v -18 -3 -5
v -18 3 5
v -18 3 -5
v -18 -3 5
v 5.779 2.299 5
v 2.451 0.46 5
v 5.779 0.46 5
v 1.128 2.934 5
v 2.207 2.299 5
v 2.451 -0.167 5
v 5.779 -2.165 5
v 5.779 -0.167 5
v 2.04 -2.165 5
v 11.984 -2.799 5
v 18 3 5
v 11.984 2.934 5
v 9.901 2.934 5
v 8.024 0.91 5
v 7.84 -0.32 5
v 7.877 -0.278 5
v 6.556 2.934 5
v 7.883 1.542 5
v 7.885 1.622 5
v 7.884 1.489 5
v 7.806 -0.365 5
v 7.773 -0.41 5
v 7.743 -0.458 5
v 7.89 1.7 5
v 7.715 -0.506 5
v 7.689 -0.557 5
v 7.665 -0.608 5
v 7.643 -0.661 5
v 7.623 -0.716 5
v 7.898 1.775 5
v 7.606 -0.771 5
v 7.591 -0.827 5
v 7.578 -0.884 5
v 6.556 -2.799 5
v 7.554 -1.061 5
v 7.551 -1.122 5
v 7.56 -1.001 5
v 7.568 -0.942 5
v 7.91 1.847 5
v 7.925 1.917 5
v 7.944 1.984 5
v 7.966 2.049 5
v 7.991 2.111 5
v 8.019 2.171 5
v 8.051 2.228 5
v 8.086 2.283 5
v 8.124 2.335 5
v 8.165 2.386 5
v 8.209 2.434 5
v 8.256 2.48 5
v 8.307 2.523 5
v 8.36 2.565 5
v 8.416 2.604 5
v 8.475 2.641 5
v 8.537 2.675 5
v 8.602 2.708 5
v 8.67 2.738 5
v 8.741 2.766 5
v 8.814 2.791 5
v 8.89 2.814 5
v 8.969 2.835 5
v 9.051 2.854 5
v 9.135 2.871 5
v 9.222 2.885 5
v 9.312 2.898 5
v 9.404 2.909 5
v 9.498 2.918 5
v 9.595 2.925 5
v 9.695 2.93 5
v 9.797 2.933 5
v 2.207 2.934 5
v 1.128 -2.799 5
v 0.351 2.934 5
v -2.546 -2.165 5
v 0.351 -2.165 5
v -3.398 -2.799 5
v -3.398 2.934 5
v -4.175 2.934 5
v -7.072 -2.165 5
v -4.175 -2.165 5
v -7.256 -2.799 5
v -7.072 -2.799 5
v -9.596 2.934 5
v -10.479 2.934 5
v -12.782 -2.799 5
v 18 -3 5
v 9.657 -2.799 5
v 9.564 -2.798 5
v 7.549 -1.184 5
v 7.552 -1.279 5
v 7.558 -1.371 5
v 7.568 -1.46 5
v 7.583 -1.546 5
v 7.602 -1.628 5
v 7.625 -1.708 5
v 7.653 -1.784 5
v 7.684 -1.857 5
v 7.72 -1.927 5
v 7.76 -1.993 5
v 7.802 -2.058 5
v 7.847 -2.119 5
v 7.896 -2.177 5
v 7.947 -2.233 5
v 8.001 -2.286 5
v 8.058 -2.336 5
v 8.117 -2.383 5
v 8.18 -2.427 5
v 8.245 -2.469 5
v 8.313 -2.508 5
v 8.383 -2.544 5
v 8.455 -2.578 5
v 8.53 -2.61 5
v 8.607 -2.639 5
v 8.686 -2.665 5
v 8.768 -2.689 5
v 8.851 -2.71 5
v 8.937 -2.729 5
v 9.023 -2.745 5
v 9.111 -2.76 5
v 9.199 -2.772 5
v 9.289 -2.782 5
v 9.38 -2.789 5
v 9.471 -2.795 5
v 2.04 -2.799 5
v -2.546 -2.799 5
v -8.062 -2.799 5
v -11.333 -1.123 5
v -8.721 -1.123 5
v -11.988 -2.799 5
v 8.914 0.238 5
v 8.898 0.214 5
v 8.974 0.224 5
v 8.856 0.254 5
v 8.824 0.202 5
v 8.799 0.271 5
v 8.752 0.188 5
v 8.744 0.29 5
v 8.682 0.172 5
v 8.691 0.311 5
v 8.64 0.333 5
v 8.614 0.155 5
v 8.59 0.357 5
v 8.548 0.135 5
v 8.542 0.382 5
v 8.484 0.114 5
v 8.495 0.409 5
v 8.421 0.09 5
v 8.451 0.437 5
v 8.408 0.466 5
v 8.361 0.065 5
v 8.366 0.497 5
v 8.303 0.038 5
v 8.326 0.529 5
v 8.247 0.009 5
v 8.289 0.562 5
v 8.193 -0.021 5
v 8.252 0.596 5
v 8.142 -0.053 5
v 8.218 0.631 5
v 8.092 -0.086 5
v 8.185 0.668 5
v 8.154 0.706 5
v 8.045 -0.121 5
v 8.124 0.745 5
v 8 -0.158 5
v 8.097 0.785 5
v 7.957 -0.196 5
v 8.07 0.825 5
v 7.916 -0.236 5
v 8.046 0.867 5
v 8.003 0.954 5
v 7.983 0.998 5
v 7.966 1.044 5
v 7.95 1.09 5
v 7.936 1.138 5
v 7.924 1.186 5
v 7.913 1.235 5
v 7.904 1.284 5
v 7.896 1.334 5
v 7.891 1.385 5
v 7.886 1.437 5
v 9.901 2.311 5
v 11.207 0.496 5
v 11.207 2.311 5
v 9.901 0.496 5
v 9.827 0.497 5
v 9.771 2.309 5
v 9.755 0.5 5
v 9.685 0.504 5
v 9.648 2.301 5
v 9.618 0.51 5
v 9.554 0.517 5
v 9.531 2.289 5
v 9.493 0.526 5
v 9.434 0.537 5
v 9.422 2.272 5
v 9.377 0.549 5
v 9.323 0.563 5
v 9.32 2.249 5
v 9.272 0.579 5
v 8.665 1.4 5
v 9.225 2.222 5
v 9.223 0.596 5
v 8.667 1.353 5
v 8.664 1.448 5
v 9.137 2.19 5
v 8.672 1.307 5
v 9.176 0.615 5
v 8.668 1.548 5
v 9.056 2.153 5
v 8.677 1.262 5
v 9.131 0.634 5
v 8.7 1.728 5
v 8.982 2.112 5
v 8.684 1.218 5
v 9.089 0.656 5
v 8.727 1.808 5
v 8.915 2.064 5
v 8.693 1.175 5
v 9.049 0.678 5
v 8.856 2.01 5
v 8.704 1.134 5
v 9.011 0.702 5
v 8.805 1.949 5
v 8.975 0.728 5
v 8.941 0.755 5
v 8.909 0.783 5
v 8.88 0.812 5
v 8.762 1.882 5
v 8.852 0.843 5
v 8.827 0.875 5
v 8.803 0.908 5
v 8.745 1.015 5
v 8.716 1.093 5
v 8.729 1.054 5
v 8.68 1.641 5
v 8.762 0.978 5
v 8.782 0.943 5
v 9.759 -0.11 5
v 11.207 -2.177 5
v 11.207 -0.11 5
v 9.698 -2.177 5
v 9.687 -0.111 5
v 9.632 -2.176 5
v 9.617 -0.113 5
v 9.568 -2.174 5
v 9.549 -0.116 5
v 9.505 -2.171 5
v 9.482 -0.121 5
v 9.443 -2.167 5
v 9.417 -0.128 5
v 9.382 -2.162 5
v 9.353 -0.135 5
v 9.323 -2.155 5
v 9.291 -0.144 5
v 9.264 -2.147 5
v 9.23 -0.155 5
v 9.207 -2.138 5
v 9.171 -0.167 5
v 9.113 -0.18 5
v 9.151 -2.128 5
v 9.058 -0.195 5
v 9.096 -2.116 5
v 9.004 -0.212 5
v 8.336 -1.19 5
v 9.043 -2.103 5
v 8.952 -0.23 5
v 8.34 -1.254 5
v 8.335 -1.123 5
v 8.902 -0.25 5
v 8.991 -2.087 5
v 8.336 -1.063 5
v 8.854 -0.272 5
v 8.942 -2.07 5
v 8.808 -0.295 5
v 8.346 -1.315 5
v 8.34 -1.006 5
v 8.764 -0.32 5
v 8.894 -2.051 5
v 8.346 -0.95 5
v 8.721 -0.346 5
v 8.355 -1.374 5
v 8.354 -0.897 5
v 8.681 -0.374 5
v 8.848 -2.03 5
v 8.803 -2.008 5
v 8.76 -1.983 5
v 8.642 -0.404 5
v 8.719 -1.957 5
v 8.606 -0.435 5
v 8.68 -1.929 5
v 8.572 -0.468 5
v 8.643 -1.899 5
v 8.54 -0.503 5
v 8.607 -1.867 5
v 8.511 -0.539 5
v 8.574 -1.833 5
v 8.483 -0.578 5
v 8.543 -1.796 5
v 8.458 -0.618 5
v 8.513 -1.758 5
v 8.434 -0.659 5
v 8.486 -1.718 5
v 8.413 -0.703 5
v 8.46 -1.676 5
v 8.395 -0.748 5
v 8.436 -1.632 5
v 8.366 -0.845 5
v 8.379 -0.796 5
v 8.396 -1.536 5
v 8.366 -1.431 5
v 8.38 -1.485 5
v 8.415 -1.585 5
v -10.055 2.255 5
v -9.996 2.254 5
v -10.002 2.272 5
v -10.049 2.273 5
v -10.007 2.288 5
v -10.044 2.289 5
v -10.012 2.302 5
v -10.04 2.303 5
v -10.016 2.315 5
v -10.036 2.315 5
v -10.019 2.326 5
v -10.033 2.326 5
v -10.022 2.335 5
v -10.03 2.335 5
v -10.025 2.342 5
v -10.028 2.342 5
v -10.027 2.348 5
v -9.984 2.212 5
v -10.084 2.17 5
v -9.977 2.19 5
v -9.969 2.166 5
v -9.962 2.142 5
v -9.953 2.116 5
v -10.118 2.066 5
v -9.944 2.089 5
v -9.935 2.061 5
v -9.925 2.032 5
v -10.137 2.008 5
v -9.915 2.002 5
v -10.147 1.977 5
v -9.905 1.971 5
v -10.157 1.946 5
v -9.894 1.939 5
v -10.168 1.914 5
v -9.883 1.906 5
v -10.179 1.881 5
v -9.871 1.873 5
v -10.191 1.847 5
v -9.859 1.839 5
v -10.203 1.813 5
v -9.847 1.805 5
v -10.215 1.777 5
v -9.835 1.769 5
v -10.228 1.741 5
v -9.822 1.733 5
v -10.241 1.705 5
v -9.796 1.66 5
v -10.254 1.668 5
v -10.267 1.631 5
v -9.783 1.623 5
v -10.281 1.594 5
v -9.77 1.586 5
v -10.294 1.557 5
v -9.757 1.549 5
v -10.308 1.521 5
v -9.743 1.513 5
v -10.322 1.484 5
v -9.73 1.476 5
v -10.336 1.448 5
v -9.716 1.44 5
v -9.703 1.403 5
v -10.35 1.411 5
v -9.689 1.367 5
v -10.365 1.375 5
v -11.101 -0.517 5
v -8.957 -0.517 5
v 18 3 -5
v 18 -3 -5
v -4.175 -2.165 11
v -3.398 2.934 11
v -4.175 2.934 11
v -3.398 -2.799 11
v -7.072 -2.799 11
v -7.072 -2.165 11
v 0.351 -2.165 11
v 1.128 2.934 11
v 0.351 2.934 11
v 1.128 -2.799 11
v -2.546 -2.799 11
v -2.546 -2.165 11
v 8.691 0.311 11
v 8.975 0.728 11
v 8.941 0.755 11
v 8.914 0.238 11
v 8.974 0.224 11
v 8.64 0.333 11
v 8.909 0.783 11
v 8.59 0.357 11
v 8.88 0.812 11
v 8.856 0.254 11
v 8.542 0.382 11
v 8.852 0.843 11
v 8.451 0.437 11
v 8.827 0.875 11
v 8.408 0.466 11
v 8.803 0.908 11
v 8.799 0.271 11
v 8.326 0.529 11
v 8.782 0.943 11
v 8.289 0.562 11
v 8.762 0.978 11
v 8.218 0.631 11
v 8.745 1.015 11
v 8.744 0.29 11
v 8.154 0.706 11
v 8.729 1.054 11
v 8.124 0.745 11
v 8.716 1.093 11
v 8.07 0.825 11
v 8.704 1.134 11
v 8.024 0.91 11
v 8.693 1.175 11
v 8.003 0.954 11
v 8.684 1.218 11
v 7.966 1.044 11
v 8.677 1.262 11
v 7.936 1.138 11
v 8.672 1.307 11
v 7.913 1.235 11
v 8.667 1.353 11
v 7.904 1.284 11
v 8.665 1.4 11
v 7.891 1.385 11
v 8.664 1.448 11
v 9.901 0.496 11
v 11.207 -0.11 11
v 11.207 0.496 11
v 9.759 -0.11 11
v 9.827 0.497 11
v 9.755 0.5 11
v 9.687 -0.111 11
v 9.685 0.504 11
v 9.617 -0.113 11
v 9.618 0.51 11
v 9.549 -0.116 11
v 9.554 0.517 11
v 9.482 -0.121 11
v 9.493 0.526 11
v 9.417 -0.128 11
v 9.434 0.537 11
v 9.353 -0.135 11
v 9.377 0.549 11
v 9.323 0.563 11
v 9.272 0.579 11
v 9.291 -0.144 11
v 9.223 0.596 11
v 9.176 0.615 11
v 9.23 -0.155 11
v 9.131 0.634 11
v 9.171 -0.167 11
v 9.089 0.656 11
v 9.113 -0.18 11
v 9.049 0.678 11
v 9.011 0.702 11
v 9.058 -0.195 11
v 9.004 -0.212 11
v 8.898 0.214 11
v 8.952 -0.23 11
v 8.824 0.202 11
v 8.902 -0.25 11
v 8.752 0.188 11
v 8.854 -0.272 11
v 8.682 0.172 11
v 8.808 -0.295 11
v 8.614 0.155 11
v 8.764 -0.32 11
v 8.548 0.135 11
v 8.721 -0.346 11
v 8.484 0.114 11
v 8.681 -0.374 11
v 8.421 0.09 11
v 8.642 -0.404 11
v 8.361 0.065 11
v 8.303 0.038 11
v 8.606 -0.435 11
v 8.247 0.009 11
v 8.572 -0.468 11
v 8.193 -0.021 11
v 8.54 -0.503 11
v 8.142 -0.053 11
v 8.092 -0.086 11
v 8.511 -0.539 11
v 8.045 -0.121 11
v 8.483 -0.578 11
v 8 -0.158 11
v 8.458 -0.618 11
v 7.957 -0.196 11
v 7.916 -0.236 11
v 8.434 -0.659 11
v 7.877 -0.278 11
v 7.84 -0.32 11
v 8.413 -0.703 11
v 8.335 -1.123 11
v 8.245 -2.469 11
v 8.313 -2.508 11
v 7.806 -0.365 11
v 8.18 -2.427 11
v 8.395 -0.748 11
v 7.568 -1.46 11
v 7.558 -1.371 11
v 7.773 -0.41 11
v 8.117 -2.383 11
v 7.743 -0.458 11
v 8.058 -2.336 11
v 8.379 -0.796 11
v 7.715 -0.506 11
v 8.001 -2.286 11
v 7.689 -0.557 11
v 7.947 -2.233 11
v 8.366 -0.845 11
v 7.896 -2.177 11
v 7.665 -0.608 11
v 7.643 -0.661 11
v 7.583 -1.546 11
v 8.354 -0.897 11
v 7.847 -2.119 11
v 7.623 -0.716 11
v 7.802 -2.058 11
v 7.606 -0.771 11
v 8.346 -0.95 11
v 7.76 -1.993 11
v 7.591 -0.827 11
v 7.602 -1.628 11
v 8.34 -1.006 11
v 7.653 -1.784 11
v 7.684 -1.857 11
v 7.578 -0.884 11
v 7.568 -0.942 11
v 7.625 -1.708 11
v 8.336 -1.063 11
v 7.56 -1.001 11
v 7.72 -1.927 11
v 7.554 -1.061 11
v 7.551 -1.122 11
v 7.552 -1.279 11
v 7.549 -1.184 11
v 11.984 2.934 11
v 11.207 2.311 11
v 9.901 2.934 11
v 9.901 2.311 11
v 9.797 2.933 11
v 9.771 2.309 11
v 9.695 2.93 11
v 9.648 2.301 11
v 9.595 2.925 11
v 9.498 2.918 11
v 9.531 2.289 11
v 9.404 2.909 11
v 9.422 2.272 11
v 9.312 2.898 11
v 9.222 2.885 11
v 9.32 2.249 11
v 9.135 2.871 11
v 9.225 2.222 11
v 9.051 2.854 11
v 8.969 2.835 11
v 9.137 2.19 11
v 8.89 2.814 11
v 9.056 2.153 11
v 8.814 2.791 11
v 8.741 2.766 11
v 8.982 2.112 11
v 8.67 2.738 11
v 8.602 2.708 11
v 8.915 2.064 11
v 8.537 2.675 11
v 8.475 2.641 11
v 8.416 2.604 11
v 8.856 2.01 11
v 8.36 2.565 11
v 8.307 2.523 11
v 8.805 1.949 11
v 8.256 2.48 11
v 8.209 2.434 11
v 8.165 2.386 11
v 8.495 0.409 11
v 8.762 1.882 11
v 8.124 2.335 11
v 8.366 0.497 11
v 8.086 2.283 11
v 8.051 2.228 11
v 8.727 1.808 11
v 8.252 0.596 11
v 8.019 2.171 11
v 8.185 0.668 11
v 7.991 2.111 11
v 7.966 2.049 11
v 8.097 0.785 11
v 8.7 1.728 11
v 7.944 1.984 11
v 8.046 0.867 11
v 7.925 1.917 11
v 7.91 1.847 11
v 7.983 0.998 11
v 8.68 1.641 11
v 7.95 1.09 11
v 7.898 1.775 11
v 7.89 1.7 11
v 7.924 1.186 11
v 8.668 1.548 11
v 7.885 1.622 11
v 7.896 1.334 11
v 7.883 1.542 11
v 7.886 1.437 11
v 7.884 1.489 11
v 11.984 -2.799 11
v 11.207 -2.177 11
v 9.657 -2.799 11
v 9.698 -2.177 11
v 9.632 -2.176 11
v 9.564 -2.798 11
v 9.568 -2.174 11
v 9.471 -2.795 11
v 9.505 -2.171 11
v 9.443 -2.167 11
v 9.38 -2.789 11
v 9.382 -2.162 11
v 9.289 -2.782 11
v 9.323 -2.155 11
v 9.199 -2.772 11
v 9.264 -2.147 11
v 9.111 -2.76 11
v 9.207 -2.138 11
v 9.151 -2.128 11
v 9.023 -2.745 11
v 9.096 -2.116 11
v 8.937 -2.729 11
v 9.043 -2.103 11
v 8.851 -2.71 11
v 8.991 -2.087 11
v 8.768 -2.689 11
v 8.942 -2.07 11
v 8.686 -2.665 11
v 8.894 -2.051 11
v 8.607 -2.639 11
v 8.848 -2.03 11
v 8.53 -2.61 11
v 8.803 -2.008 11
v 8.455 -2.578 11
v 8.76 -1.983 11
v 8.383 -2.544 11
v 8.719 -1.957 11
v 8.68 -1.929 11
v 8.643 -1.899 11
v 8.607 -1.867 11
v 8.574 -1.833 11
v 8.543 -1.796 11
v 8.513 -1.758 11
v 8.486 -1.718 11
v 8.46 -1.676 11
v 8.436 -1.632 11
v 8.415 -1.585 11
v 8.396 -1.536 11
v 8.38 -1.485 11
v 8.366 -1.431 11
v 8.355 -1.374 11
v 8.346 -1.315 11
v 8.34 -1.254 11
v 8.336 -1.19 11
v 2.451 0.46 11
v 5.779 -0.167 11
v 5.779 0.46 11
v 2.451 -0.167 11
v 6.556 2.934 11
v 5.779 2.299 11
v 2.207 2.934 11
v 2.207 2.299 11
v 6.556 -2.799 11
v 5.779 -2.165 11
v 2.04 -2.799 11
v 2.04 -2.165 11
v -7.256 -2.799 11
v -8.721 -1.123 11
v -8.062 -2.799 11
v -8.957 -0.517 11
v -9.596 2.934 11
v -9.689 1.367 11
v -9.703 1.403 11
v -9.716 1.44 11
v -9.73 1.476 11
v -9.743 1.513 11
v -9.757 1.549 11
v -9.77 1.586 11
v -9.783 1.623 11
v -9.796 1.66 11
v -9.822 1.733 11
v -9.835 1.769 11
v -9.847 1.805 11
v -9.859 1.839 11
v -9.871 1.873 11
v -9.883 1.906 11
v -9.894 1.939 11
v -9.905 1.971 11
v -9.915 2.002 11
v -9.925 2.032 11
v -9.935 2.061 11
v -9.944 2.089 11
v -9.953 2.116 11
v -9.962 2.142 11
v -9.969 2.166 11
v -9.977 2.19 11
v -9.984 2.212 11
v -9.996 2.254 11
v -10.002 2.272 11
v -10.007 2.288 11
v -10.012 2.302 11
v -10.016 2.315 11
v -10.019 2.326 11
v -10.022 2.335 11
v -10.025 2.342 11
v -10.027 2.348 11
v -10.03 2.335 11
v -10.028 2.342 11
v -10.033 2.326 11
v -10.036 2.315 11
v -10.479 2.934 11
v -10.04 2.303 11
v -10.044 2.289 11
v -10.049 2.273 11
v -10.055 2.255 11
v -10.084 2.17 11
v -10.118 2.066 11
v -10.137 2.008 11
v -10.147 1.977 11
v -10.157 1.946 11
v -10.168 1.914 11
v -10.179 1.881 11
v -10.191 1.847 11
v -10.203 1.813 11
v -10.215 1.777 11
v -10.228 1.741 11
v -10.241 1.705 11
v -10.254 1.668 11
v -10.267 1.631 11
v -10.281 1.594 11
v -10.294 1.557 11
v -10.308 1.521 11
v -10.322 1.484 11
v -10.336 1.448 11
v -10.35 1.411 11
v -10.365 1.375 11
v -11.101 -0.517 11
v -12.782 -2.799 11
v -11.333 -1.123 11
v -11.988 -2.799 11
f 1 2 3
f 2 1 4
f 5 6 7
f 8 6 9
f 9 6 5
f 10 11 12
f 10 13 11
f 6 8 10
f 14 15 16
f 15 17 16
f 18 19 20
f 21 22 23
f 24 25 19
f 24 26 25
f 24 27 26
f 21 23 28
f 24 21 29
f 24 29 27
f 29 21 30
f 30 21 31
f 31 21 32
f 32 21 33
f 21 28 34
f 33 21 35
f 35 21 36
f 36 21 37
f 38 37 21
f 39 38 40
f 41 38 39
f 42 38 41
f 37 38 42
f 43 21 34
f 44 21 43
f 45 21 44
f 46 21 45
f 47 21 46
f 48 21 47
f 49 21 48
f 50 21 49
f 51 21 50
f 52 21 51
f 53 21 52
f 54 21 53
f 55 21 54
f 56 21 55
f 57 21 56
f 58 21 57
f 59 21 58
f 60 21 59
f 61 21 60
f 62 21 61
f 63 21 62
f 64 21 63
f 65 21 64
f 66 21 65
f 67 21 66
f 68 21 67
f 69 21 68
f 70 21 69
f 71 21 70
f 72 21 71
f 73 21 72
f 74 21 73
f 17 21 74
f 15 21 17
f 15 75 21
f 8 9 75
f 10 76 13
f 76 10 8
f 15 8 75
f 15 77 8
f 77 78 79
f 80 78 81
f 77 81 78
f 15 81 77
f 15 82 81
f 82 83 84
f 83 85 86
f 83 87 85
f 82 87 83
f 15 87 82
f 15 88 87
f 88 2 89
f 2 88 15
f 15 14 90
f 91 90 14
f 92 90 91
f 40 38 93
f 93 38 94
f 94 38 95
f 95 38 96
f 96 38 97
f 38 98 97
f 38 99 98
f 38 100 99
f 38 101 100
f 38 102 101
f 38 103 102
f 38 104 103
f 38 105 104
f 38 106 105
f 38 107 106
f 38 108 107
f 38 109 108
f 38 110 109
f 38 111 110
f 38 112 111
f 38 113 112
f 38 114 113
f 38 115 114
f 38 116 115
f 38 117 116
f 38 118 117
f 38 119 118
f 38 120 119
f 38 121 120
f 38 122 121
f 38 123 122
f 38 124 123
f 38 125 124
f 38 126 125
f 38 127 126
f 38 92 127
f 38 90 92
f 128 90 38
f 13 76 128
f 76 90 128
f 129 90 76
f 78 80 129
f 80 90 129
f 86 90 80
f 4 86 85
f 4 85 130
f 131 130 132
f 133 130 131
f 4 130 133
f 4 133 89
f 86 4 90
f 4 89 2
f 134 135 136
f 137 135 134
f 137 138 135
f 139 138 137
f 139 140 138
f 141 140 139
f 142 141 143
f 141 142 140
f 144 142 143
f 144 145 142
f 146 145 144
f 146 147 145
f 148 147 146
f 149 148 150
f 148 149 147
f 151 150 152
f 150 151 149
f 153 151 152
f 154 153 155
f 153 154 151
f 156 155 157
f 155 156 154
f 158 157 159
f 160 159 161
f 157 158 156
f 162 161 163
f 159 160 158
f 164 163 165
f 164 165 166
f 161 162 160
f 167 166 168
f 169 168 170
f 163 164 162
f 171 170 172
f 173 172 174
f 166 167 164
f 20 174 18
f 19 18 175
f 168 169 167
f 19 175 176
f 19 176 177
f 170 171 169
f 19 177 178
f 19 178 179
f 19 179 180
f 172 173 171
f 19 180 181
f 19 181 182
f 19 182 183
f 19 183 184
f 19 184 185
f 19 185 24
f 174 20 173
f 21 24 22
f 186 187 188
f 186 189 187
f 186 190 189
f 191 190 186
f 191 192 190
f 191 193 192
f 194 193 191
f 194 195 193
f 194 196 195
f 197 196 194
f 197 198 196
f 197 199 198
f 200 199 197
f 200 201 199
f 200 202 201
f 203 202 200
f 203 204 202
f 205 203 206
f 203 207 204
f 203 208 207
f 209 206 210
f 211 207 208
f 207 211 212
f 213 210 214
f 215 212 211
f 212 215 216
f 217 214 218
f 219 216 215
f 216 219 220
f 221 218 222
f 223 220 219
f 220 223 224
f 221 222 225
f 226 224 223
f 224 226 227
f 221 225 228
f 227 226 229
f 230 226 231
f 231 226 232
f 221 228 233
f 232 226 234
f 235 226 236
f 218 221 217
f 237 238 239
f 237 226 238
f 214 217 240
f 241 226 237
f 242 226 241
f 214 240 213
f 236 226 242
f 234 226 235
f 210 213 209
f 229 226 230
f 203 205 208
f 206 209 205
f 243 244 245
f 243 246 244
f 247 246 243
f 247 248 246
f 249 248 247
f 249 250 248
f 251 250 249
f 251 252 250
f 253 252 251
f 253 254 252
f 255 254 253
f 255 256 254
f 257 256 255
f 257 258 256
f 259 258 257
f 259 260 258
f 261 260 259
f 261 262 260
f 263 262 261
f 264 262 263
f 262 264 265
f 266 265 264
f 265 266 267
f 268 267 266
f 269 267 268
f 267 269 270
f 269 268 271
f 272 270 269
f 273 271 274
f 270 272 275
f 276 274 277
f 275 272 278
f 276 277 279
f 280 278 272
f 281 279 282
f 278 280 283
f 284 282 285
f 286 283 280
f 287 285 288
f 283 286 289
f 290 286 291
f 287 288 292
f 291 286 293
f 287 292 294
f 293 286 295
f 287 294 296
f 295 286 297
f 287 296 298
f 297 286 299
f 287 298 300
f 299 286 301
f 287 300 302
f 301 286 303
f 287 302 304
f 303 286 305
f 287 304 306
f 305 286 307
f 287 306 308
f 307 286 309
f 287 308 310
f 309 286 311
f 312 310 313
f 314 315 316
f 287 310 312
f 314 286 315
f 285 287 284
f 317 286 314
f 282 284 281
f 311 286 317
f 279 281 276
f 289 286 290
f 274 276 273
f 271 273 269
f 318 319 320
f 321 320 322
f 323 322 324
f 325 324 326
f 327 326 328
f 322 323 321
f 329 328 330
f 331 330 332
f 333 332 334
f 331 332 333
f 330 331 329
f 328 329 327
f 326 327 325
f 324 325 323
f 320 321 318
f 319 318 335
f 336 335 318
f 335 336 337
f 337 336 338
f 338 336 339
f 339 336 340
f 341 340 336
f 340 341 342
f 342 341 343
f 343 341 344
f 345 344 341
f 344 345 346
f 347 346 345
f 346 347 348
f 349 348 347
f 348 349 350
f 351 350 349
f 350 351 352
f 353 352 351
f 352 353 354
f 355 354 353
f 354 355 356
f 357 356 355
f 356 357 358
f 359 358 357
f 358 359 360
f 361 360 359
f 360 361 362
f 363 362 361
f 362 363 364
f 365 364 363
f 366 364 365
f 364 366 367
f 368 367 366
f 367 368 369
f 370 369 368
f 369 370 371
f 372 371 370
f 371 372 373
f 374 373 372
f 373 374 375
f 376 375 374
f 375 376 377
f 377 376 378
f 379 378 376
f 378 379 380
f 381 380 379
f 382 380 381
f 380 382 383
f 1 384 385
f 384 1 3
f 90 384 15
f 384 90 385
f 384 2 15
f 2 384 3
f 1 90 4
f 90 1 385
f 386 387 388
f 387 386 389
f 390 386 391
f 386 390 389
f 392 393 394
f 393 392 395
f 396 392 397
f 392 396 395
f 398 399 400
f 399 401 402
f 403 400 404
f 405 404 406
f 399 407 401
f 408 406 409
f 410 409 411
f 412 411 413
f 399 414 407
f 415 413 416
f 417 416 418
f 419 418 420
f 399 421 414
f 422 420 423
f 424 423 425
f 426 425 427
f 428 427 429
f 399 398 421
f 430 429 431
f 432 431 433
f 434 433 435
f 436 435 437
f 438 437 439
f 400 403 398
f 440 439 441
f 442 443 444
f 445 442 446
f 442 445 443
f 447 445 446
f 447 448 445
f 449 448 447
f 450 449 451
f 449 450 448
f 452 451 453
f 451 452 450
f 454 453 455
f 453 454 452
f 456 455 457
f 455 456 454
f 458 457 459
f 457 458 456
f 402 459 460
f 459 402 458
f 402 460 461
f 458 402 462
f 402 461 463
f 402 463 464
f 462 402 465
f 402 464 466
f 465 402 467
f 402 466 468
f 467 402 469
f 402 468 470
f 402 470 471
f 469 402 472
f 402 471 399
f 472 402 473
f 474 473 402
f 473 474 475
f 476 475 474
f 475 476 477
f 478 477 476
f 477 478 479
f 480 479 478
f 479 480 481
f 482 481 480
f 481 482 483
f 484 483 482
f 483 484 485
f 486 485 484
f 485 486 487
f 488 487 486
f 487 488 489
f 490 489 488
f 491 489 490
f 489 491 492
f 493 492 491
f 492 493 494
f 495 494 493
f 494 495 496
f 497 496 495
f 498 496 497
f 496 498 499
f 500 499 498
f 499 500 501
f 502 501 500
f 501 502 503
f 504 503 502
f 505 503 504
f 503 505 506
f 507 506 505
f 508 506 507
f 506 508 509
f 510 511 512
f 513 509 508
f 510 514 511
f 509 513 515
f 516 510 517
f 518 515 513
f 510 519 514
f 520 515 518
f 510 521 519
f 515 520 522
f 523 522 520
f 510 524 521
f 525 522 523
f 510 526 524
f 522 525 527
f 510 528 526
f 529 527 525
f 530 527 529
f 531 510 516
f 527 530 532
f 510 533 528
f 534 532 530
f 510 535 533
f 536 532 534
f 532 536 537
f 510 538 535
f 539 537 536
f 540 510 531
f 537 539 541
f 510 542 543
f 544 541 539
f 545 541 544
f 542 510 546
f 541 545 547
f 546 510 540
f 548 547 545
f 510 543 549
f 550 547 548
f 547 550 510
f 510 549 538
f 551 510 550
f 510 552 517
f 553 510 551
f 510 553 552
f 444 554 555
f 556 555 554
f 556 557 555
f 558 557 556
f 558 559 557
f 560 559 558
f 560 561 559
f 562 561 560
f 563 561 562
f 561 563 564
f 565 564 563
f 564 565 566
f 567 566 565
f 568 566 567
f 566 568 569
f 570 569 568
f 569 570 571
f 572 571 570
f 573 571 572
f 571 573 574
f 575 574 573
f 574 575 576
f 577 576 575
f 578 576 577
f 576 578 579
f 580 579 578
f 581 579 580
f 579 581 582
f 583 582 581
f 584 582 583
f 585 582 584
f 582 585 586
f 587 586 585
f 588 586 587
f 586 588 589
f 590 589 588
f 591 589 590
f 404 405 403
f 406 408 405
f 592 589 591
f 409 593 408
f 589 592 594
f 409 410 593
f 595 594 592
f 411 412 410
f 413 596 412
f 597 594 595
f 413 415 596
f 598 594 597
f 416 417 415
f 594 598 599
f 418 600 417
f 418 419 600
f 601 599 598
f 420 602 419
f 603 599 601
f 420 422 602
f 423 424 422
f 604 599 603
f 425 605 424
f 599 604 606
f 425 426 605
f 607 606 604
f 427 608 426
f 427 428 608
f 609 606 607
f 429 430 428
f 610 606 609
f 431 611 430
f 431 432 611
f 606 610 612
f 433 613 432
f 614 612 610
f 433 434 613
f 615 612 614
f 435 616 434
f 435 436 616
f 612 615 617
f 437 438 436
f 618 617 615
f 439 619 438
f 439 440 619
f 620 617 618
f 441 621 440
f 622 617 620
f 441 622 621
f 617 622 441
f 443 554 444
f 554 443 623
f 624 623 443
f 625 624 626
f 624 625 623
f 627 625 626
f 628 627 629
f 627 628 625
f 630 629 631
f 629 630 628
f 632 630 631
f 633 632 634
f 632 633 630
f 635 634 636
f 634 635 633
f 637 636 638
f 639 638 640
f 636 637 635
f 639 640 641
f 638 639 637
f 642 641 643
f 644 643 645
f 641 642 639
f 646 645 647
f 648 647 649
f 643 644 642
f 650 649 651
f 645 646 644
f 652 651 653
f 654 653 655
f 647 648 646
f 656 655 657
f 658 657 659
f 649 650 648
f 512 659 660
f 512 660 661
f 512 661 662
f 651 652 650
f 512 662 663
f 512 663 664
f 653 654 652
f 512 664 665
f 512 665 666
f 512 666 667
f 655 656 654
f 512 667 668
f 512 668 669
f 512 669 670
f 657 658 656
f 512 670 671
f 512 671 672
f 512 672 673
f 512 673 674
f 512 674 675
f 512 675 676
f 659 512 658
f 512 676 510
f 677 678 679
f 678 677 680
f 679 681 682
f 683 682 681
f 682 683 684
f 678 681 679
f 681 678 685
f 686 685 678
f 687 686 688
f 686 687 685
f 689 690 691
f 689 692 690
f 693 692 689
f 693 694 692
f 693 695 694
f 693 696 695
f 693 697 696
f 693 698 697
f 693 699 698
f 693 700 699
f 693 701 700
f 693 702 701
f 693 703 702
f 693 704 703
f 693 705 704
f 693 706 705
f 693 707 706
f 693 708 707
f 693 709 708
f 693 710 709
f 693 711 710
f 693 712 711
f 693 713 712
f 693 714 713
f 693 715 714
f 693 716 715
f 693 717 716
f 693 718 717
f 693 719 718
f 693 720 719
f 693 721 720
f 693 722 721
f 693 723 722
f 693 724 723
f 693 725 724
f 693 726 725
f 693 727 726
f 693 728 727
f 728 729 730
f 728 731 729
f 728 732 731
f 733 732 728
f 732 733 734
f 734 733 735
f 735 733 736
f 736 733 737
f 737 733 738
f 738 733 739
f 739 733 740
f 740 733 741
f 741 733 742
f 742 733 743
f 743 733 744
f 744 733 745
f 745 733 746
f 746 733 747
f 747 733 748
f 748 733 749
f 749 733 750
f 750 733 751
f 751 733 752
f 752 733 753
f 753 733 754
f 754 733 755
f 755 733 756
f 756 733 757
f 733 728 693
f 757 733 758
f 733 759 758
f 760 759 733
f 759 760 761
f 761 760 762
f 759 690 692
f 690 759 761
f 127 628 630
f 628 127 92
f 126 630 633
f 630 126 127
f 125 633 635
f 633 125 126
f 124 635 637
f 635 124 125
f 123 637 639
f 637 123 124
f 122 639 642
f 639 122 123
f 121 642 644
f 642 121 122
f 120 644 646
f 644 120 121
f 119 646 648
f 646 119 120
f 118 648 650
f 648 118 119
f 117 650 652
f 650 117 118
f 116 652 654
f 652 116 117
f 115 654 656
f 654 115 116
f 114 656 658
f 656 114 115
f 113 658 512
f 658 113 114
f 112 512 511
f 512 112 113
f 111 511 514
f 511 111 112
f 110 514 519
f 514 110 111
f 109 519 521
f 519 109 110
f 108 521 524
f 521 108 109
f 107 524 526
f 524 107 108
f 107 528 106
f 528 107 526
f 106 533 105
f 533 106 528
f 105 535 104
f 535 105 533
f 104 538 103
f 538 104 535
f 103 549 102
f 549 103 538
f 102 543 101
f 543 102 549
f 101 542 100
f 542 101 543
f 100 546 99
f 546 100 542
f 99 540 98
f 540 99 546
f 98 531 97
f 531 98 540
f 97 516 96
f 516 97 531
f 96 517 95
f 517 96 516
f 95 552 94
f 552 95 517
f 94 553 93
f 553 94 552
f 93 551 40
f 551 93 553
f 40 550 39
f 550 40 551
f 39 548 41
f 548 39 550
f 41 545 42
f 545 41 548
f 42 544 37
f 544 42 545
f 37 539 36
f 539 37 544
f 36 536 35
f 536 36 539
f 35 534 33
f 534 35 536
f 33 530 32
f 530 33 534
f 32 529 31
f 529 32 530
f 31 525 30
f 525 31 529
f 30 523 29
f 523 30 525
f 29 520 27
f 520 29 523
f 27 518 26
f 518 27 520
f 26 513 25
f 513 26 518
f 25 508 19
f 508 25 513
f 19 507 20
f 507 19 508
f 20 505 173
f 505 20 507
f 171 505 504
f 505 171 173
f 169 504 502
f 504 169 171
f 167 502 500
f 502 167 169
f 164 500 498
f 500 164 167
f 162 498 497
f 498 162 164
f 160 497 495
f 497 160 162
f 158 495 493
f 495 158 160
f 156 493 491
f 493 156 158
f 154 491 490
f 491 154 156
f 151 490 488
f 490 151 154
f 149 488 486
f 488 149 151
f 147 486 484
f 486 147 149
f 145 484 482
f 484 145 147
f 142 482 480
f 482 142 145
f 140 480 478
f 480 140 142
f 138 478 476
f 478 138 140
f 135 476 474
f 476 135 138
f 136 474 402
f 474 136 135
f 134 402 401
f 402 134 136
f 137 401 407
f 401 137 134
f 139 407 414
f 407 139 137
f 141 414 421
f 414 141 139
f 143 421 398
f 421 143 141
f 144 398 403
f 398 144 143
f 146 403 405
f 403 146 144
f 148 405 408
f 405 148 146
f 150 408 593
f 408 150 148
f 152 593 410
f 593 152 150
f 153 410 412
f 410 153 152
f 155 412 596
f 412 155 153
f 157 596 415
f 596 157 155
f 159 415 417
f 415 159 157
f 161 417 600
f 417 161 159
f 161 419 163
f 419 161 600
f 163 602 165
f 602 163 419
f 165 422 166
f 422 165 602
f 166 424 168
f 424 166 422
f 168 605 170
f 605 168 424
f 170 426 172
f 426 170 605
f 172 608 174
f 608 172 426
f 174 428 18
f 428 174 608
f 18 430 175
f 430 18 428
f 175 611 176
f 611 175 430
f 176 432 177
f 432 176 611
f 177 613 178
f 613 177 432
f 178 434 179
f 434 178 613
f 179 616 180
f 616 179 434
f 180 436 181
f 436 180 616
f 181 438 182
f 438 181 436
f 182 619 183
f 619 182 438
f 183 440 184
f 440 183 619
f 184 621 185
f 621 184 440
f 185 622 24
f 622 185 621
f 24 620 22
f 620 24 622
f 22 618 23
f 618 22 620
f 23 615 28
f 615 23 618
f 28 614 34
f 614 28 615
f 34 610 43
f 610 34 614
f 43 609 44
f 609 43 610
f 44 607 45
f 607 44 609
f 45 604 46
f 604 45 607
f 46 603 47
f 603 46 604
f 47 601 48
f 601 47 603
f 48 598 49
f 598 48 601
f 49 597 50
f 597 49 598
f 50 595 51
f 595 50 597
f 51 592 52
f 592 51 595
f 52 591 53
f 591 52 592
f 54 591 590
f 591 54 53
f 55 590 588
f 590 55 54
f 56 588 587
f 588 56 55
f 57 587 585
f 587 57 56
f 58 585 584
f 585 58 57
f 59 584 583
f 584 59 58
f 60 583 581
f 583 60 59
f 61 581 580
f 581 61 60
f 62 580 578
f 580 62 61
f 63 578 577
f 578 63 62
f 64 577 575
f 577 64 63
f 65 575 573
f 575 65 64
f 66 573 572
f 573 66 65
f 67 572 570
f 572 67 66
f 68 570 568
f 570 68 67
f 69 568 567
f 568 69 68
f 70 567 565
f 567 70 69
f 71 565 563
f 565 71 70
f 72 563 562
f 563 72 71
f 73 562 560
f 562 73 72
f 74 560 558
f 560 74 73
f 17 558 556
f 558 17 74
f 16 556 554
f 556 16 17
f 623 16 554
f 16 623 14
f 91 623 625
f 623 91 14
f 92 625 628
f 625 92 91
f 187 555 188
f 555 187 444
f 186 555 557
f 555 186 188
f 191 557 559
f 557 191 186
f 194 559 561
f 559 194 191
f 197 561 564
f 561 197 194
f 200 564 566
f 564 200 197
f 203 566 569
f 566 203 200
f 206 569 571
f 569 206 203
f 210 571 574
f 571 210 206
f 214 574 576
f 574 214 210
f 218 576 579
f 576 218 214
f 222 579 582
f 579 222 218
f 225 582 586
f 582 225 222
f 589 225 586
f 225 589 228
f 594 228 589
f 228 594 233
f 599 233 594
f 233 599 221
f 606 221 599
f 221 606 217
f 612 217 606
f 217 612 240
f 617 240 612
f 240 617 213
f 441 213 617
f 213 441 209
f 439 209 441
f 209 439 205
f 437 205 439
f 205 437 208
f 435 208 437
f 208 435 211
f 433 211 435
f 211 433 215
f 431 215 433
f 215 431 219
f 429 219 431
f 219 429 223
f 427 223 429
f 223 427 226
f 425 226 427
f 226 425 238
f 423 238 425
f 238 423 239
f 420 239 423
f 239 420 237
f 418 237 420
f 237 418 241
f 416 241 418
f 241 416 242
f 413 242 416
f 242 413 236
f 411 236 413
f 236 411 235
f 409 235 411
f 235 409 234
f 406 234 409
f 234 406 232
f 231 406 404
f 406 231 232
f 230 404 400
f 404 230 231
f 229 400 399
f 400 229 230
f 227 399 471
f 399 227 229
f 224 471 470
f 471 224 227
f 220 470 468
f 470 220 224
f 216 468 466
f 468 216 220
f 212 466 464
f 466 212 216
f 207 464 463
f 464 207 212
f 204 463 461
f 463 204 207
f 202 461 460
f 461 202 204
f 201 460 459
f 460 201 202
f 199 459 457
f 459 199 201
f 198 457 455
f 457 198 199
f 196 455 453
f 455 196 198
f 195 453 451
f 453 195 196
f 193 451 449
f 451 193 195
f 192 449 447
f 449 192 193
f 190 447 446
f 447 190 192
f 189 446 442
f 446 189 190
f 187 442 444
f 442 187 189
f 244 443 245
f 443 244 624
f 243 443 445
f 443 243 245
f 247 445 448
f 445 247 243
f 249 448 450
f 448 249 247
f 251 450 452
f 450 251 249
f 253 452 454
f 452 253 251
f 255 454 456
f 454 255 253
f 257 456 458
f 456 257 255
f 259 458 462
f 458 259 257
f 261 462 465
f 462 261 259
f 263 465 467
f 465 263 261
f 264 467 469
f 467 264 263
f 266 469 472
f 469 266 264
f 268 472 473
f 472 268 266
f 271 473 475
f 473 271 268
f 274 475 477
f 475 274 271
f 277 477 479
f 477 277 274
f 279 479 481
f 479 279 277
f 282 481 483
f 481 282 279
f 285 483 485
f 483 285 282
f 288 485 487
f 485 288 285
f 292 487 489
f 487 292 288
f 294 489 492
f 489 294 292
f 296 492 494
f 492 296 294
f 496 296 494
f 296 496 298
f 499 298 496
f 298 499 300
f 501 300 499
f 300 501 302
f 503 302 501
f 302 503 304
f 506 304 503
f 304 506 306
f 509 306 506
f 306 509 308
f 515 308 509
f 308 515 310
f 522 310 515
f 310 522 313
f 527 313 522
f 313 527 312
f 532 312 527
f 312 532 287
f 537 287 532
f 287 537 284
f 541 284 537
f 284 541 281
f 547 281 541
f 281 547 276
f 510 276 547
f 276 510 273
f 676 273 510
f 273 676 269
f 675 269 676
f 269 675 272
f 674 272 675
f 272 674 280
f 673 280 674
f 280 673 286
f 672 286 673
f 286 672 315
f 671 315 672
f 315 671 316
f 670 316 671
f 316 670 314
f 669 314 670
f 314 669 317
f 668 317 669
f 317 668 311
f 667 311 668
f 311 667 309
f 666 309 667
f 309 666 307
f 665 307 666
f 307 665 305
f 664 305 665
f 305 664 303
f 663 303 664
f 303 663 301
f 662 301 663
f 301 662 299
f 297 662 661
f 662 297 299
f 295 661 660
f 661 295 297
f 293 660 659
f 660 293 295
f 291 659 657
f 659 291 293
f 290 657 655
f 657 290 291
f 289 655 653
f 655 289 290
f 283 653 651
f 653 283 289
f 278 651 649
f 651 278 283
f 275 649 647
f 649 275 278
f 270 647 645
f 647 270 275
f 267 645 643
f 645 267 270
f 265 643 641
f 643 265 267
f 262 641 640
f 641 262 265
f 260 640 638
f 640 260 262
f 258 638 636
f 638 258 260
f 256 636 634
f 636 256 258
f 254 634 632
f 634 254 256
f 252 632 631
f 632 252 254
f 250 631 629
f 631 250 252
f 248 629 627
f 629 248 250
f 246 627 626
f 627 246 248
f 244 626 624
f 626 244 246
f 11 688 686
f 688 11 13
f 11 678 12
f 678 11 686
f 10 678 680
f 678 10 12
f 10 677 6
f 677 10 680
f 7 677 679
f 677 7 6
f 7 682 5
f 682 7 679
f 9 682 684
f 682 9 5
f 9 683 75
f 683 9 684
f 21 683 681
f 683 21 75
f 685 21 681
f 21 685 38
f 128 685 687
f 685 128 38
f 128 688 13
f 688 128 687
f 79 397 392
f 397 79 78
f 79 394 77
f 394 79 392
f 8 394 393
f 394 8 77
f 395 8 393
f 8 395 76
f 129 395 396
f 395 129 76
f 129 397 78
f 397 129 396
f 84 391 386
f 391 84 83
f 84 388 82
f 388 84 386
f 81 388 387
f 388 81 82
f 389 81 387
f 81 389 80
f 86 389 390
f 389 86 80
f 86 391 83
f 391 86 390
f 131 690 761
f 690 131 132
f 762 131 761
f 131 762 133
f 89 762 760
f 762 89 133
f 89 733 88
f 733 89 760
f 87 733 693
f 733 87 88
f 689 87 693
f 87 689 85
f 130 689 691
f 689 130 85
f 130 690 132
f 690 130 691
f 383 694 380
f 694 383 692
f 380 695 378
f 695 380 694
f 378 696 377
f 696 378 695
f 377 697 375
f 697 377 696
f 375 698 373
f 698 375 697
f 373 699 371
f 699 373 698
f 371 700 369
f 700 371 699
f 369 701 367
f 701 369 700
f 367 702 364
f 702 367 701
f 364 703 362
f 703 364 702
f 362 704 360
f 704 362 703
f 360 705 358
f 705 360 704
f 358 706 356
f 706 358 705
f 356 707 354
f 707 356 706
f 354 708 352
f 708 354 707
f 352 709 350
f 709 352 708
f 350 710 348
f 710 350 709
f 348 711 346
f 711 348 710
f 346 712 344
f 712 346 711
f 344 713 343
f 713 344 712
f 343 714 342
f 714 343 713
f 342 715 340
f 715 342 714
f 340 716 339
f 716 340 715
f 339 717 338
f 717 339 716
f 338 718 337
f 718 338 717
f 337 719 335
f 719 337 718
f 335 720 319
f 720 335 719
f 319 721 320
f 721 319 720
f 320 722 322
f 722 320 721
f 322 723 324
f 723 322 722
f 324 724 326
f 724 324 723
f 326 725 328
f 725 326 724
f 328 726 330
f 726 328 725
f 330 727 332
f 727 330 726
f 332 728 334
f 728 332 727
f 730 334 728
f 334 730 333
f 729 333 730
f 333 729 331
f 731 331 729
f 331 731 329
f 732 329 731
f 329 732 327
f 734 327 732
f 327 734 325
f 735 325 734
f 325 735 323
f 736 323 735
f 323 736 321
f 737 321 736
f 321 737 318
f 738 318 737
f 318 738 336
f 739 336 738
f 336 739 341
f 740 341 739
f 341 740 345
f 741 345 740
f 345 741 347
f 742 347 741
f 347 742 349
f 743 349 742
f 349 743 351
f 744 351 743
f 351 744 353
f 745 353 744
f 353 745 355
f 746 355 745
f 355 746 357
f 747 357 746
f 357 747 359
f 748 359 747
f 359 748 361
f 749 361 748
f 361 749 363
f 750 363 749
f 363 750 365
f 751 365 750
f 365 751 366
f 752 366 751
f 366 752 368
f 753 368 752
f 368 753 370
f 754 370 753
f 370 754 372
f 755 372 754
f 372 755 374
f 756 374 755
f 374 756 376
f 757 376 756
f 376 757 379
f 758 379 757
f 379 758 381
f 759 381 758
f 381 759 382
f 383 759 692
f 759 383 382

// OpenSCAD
// ===== 参数设置 =====
name          = "BELLA";   // 默认印章文字（会被命令行覆盖）
base_len      = 36;        // 底座长度，会被 -D base_len=xx 覆盖
base_width    = 6;         // 底座宽度 (Y)
base_height   = 10;        // 底座高度 (Z)

letter_size   = 6;         // 字体高度 (size)
letter_height = 6;         // 文字挤出高度
font_name     = "Arial";   // 字体

$fn = 64;                  // 圆弧精细度（可选）

// 文字底面往底座里多埋一点点。
// 原来是严丝合缝贴在 z=base_height/2 上，两个面完全共面，
// CGAL 做并集时要反复切分共面面片，单个名字会从 3 秒拖到 13 秒。
// 往下埋 0.05mm（打印精度以下，肉眼和成品都看不出来）后共面消失，
// 并集恢复正常速度，顺带保证模型是连通的、不会出现悬空文字。
overlap = 0.05;

// ===== 主体模块 =====
module stamp_body() {
    union() {
        // 底座：居中放置
        cube([base_len, base_width, base_height], center = true);

        // 文字：放在底座顶面，向上拉伸（底部下沉 overlap 保证与底座相交）
        translate([0, 0, base_height/2 - overlap])
            linear_extrude(height = letter_height + overlap)
                text(name,
                     size   = letter_size,
                     font   = font_name,
                     halign = "center",
                     valign = "center");
    }
}

// ===== 镜像整个印章（压印后文字为正） =====
mirror([1, 0, 0])   // 沿 YZ 平面左右翻转
    stamp_body();
